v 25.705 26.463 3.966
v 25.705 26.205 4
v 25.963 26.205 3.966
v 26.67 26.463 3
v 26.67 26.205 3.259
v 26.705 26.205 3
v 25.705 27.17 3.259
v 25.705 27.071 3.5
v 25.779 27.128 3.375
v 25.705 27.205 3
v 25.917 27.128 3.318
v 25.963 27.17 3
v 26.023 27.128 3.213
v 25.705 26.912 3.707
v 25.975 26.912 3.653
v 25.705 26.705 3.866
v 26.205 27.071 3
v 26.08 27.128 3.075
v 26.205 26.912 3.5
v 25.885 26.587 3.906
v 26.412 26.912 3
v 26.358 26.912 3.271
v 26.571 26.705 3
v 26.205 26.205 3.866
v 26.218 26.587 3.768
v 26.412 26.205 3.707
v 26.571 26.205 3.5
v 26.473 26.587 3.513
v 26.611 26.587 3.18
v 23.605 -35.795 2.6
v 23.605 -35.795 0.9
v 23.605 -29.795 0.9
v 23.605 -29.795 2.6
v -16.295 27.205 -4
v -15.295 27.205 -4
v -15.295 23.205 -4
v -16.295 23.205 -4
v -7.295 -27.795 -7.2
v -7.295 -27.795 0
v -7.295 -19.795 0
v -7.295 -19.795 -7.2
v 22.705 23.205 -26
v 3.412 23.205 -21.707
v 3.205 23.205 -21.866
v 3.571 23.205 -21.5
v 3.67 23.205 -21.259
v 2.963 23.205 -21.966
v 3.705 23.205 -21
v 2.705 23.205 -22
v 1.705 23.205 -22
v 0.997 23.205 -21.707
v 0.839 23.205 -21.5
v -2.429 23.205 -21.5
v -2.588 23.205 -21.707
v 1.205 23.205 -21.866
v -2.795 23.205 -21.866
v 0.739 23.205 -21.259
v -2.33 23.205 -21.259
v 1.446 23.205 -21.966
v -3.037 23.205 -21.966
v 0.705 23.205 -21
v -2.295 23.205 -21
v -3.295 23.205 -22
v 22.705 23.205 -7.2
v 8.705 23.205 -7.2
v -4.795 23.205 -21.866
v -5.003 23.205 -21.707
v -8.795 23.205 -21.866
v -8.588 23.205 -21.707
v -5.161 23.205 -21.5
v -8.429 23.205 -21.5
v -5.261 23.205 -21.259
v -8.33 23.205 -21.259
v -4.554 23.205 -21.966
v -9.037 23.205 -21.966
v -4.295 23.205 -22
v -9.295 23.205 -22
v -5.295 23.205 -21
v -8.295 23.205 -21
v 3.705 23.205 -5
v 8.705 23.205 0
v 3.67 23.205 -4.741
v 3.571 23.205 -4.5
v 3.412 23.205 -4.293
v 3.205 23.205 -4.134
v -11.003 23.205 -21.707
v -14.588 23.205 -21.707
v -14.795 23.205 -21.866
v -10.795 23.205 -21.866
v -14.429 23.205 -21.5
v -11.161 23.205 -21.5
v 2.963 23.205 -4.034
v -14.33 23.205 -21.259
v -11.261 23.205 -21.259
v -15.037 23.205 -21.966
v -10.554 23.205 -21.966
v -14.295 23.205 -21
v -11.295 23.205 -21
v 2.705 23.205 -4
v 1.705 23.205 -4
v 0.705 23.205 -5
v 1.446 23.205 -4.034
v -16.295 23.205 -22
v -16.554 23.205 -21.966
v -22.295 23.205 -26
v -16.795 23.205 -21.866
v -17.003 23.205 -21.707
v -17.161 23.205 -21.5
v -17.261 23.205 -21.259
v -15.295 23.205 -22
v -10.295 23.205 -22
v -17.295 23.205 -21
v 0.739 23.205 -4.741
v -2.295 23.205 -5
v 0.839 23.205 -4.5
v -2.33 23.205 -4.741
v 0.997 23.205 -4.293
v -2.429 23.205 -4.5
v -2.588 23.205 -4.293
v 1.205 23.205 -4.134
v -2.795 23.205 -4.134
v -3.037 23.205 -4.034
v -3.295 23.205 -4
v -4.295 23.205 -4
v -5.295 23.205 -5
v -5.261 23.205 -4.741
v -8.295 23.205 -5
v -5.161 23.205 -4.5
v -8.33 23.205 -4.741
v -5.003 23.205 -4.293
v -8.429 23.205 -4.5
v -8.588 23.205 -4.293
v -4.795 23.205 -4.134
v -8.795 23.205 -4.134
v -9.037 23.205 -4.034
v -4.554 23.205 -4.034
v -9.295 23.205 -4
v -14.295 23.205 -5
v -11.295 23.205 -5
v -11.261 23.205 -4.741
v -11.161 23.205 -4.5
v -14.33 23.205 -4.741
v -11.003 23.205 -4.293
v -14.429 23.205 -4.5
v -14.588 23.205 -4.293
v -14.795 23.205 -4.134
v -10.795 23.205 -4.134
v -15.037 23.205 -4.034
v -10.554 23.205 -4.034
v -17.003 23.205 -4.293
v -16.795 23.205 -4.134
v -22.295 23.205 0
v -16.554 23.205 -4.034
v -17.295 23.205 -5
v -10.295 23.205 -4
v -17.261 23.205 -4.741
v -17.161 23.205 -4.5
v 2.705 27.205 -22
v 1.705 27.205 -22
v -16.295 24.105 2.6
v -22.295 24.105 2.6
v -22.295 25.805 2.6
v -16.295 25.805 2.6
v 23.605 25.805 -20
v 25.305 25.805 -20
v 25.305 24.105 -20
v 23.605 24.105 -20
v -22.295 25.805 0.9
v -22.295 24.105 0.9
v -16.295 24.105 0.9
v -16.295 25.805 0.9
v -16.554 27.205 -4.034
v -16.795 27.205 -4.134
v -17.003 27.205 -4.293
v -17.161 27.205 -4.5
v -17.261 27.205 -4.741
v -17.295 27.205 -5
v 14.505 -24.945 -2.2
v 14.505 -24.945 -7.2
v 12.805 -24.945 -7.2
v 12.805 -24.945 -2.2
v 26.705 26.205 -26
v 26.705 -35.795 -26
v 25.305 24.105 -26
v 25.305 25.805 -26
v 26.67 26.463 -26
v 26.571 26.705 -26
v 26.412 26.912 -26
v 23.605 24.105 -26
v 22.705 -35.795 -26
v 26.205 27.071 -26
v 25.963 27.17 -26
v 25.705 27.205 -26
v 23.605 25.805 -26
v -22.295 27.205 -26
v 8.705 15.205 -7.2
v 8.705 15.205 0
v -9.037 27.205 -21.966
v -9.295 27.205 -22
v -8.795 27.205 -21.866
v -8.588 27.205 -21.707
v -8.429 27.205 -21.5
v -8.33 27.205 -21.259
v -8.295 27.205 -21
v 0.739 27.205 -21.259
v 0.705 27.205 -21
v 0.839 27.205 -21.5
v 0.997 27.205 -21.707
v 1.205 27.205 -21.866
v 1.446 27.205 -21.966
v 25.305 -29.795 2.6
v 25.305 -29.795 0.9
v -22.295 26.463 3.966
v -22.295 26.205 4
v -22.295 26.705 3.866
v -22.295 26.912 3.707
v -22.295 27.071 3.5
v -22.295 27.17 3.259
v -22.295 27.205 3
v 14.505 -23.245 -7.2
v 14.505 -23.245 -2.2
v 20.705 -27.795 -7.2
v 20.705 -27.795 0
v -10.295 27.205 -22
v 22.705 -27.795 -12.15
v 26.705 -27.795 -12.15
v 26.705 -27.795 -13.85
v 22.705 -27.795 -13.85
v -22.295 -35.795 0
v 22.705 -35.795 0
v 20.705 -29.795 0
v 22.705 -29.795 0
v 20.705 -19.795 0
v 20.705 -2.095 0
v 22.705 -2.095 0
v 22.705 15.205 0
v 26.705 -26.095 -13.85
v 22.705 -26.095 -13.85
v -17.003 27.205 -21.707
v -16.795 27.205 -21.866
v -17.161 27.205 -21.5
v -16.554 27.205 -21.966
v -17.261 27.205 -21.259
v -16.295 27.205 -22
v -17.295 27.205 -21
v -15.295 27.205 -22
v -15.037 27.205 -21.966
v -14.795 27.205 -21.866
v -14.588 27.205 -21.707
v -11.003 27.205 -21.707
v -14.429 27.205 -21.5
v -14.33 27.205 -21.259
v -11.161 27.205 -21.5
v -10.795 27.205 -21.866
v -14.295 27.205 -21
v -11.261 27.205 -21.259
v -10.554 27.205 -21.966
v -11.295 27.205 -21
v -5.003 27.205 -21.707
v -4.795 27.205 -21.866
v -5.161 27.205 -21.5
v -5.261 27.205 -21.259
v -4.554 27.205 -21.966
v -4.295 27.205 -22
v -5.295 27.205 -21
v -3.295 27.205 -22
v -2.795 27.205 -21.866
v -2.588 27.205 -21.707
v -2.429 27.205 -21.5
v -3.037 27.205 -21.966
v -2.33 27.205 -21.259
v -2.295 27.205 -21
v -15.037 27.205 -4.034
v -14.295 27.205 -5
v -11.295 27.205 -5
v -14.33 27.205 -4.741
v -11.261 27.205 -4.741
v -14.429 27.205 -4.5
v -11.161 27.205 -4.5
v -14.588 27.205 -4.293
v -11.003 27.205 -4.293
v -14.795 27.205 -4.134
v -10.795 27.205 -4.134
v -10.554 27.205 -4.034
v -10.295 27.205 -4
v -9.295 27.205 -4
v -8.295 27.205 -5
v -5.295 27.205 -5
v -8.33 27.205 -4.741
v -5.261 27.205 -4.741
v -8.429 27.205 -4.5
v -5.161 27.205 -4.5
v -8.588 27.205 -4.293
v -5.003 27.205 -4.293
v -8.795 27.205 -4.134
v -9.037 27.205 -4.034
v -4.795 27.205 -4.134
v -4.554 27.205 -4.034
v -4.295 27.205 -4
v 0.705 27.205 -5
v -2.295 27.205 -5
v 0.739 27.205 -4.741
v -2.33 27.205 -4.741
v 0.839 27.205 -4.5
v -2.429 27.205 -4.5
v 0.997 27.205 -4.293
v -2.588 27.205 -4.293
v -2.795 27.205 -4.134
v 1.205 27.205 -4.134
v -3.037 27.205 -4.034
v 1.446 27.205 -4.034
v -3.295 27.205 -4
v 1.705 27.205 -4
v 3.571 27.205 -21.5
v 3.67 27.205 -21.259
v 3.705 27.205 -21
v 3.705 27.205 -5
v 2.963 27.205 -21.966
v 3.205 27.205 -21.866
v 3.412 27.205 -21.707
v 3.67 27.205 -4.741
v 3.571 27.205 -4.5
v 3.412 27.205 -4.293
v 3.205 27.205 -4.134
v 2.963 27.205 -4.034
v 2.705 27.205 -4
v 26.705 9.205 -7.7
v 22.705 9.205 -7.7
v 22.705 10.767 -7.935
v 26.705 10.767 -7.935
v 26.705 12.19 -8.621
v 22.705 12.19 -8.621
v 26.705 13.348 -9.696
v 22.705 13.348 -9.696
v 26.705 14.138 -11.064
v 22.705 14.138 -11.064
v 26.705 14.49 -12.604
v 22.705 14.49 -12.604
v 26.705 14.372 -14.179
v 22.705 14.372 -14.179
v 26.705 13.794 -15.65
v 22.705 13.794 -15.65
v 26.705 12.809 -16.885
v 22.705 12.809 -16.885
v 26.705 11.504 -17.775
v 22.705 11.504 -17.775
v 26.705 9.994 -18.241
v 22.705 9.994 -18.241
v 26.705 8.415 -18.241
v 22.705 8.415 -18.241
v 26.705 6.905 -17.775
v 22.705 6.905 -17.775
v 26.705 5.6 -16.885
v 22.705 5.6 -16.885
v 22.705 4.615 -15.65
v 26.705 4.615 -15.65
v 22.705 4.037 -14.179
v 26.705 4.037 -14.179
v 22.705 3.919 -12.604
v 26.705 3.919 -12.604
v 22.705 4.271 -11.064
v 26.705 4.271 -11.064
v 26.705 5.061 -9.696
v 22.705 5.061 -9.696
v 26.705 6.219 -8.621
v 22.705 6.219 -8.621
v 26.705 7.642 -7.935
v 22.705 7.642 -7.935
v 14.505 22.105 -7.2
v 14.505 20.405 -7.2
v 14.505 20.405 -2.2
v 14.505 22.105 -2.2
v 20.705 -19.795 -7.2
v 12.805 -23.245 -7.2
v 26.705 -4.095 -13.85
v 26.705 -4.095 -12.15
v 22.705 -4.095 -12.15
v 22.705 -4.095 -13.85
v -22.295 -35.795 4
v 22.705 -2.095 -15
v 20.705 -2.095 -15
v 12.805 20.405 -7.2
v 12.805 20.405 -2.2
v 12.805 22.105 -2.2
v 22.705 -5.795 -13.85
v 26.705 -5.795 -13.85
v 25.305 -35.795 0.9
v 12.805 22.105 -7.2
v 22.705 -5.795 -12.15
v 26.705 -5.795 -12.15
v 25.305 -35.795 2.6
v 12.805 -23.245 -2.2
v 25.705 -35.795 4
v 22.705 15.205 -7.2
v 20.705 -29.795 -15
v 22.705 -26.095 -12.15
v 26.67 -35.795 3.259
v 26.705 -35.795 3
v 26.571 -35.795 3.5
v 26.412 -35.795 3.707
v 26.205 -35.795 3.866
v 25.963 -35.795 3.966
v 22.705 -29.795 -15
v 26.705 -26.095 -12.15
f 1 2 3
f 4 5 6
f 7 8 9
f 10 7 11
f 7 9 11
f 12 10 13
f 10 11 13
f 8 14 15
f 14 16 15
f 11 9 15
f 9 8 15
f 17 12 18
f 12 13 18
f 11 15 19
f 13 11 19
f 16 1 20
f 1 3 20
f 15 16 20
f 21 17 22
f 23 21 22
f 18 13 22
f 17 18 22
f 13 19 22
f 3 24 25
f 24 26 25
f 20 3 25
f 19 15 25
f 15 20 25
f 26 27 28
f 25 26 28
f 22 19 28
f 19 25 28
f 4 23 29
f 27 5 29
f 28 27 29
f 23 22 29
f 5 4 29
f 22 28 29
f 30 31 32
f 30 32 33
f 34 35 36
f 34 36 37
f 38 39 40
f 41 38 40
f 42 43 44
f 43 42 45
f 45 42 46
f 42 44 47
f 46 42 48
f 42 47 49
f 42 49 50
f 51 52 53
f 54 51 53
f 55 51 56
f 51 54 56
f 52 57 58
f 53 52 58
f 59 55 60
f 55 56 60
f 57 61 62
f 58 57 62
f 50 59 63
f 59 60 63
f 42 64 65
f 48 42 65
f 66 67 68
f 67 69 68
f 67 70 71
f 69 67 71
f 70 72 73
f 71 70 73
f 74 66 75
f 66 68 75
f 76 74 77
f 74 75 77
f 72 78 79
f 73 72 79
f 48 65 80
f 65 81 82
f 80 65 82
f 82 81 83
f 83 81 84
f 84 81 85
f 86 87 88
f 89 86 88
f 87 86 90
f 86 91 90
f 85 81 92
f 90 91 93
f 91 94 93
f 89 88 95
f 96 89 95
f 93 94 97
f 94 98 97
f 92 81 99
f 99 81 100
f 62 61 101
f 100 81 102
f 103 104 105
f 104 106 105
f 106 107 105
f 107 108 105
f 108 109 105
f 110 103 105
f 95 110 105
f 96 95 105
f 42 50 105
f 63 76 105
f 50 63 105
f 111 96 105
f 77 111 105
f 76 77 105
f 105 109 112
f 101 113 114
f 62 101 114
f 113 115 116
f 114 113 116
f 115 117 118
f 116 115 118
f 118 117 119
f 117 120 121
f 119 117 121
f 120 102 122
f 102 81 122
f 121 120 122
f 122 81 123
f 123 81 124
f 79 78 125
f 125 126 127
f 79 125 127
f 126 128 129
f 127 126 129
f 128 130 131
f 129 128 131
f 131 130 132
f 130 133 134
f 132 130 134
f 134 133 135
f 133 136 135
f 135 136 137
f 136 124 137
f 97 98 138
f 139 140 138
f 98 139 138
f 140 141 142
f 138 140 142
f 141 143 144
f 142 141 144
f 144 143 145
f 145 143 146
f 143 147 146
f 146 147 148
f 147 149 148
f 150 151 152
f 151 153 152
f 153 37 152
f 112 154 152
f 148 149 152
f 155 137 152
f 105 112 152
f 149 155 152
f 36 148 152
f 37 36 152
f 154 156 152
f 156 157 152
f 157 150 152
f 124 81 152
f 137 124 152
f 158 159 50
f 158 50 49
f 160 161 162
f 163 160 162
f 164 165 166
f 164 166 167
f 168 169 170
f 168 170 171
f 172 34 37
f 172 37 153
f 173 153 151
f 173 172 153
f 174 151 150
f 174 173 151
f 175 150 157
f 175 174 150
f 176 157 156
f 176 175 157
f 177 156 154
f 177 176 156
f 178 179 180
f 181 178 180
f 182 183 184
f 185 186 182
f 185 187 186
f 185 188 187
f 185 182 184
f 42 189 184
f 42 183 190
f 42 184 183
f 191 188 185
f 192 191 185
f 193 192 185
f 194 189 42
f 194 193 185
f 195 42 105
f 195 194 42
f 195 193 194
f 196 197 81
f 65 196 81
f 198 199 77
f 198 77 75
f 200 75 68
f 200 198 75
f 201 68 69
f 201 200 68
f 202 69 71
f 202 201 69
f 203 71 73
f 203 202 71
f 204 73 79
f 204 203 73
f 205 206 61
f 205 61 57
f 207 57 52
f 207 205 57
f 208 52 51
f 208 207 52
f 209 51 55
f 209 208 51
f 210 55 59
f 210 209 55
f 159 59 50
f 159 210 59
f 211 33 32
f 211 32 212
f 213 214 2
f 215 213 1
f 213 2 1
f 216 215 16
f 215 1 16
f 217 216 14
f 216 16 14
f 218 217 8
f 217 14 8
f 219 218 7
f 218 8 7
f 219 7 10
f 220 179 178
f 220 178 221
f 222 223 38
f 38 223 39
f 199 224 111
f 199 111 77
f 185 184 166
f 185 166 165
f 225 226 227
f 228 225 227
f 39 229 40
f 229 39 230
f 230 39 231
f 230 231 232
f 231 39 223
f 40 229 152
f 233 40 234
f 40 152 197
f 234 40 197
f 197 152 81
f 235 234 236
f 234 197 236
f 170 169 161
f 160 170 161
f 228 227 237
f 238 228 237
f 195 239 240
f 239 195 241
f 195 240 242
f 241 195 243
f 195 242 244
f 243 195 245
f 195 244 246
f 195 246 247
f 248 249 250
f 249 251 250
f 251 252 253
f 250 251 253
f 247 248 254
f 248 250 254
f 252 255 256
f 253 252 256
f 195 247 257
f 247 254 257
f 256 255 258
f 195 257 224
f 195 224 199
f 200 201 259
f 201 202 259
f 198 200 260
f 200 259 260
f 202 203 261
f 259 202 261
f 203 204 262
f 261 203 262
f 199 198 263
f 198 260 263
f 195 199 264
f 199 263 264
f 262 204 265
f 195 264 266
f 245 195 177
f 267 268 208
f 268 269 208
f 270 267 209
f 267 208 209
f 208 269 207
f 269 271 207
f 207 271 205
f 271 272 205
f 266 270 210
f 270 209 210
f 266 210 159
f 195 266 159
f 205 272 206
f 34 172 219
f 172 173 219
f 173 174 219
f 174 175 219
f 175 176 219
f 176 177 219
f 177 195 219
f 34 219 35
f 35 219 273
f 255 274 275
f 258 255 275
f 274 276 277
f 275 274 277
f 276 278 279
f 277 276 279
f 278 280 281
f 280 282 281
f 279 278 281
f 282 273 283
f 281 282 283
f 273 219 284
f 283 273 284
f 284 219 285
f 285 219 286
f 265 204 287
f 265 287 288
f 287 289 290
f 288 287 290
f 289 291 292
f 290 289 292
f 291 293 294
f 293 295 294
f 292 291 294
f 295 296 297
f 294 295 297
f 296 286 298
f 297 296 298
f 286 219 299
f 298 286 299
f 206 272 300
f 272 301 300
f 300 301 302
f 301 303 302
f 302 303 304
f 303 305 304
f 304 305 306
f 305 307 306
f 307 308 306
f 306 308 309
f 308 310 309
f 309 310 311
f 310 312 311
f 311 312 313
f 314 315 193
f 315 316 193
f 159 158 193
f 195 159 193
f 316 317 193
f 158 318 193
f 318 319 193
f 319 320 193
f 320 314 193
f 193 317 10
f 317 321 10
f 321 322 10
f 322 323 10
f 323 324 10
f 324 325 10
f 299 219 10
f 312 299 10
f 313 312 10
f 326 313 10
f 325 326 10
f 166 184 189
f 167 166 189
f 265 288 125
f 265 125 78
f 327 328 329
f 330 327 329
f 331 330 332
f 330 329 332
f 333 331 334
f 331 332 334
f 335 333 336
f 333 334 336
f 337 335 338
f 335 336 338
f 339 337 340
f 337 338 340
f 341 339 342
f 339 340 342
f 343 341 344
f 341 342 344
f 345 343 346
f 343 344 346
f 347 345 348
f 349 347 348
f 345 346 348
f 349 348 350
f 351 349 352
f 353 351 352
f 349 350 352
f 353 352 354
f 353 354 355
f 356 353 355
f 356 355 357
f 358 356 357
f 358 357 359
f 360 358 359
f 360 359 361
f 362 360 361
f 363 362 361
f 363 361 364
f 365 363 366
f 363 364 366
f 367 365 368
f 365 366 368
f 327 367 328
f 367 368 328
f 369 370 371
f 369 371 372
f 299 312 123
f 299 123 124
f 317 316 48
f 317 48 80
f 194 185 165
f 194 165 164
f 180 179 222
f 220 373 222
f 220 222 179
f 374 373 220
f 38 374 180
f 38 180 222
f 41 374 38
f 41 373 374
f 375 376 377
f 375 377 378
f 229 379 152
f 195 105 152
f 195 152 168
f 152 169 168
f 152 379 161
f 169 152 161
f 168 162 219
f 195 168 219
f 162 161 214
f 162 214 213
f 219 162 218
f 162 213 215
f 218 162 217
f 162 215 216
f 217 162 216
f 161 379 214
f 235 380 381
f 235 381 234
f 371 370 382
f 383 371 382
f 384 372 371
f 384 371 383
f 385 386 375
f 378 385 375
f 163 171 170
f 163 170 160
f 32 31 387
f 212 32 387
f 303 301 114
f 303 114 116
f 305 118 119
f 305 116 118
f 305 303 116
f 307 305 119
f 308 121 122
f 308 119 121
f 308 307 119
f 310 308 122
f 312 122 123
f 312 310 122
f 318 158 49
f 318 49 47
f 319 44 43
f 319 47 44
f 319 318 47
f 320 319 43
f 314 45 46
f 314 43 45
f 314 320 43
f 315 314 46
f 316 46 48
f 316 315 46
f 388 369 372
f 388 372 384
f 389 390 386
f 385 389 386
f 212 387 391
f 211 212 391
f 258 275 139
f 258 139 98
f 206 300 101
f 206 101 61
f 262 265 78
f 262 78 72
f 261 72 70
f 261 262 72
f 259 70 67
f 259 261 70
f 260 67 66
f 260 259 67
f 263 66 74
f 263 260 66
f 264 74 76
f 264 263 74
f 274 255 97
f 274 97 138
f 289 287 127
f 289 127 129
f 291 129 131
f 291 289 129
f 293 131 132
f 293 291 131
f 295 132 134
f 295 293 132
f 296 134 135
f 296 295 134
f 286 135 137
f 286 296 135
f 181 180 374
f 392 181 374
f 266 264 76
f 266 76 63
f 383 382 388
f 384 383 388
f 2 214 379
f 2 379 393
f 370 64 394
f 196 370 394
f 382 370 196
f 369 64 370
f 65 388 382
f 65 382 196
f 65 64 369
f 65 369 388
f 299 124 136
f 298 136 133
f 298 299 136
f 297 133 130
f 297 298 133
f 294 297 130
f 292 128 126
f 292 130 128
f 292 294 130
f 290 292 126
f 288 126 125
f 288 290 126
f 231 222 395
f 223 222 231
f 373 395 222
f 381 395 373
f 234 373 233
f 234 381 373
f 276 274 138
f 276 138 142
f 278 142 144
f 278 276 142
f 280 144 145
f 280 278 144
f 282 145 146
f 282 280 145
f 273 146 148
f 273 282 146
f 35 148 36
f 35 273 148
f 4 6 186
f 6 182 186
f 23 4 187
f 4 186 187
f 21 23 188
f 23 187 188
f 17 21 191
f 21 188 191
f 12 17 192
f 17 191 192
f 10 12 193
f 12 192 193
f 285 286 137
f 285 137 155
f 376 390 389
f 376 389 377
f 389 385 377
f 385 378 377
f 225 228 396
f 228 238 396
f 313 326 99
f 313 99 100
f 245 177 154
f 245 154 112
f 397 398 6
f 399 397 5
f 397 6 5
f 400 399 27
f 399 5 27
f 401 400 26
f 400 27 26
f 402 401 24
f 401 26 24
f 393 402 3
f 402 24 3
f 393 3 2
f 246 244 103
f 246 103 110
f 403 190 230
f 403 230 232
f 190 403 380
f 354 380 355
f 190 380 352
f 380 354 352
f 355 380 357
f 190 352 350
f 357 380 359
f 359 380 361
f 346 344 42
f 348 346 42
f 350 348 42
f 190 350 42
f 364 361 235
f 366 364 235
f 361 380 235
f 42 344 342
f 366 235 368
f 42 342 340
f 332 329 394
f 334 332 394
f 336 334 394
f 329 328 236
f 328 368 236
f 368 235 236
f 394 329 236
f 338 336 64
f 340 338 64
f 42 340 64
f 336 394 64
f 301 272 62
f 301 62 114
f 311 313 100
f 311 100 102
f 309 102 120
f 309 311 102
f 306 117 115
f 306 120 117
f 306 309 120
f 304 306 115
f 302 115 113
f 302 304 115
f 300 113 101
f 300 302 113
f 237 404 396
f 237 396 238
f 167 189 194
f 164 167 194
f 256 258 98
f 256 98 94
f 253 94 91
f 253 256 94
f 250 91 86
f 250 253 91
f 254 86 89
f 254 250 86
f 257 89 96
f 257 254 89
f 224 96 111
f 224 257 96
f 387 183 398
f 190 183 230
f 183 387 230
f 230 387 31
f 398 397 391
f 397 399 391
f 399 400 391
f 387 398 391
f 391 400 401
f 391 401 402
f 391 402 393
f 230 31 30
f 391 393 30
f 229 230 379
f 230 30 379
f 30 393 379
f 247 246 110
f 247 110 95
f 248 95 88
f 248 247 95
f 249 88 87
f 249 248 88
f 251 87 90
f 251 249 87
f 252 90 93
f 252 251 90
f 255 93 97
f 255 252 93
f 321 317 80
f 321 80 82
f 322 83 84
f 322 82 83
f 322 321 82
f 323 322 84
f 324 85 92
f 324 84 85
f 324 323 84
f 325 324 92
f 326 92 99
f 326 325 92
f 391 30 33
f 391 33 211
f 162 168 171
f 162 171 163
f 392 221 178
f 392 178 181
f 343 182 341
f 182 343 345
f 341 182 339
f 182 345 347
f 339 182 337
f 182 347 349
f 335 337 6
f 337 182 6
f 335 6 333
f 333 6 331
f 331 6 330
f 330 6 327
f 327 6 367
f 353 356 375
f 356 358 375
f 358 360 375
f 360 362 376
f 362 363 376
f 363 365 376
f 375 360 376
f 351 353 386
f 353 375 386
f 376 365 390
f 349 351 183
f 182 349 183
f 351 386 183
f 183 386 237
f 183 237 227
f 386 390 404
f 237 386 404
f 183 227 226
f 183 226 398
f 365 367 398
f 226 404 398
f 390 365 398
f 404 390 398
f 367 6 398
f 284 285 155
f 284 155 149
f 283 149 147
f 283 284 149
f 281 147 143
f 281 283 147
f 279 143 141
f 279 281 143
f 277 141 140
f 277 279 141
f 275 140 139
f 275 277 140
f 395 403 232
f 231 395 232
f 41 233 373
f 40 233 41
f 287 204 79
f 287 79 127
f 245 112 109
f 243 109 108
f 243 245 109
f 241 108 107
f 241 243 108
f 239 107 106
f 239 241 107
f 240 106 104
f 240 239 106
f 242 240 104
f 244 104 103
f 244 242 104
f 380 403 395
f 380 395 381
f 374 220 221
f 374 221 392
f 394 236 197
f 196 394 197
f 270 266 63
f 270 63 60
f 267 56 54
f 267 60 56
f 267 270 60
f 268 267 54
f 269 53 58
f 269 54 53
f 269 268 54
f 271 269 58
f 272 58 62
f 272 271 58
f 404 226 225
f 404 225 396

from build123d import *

# Parameters (mm, degrees)
SKETCH_1_W          = 49
SKETCH_1_H          = 63
EXTRUDE_1_DEPTH     = 4
SKETCH_2_W          = 45
SKETCH_2_H          = 4
SKETCH_2_W_2        = 4
SKETCH_2_H_2        = 59
EXTRUDE_2_DEPTH     = 26
SKETCH_3_W          = 14
SKETCH_3_H          = 8
SKETCH_3_W_2        = 30
EXTRUDE_3_DEPTH     = 7.2
SKETCH_5_R          = 5.3
CUT_EXTRUDE_1_DEPTH = 4
SKETCH_7_W          = 1.7
SKETCH_7_H          = 1.7
CUT_EXTRUDE_3_DEPTH = 6
SKETCH_8_W          = 1.7
SKETCH_8_H          = 1.7
CUT_EXTRUDE_4_DEPTH = 6
SKETCH_9_W          = 1.7
SKETCH_9_H          = 1.7
CUT_EXTRUDE_5_DEPTH = 6
FILLET_1_R          = 1
SKETCH_6_W          = 1.7
SKETCH_6_H          = 1.7
CUT_EXTRUDE_7_DEPTH = 5
SKETCH_10_W         = 15
SKETCH_10_H         = 27.7
EXTRUDE_4_DEPTH     = 2
CUT_EXTRUDE_8_DEPTH = 13
SKETCH_12_W         = 1.7
SKETCH_12_H         = 1.7
CUT_EXTRUDE_9_DEPTH = 5


with BuildPart() as part:
    # Эскиз1 → Бобышка-Вытянуть1 (new body)
    with BuildSketch(Plane.XY):
        with Locations((2.204545455, -4.295454545)):
            Rectangle(SKETCH_1_W, SKETCH_1_H)
    extrude(amount=EXTRUDE_1_DEPTH)

    # Эскиз2 → Бобышка-Вытянуть2 (add)
    with BuildSketch(Plane(origin=(0, 0, 0), x_dir=(-1, 0, 0), z_dir=(0, 0, -1))):
        with Locations((-0.204545455, 25.204545455)):
            Rectangle(SKETCH_2_W, SKETCH_2_H)
        with Locations((-24.704545455, -6.295454545)):
            Rectangle(SKETCH_2_W_2, SKETCH_2_H_2)
        with Locations((-24.704545455, 25.204545455)):
            Rectangle(SKETCH_2_W_2, SKETCH_2_H)
    extrude(amount=EXTRUDE_2_DEPTH)

    # Эскиз3 → Бобышка-Вытянуть3 (add)
    with BuildSketch(Plane(origin=(0, 0, 0), x_dir=(-1, 0, 0), z_dir=(0, 0, -1))):
        with Locations((-15.704545455, 19.204545455)):
            Rectangle(SKETCH_3_W, SKETCH_3_H)
        with Locations((-7.704545455, -23.795454545)):
            Rectangle(SKETCH_3_W_2, SKETCH_3_H)
    extrude(amount=EXTRUDE_3_DEPTH)

    # Эскиз5 → Вырез-Вытянуть1 (cut)
    with BuildSketch(Plane.ZY.offset(-22.704545455)):
        with Locations((-13, 9.204545455)):
            Circle(SKETCH_5_R)
    extrude(amount=-CUT_EXTRUDE_1_DEPTH, mode=Mode.SUBTRACT)

    # Эскиз7 → Вырез-Вытянуть3 (cut)
    with BuildSketch(Plane.ZY.offset(22.295454545)):
        with Locations((1.75, 24.954545455)):
            Rectangle(SKETCH_7_W, SKETCH_7_H)
    extrude(amount=-CUT_EXTRUDE_3_DEPTH, mode=Mode.SUBTRACT)

    # Эскиз8 → Вырез-Вытянуть4 (cut)
    with BuildSketch(Plane.XZ.offset(35.795454545)):
        with Locations((24.454545455, 1.75)):
            Rectangle(SKETCH_8_W, SKETCH_8_H)
    extrude(amount=-CUT_EXTRUDE_4_DEPTH, mode=Mode.SUBTRACT)

    # Эскиз9 → Вырез-Вытянуть5 (cut)
    with BuildSketch(Plane(origin=(0, 0, -26), x_dir=(-1, 0, 0), z_dir=(0, 0, -1))):
        with Locations((-24.454545455, 24.954545455)):
            Rectangle(SKETCH_9_W, SKETCH_9_H)
    extrude(amount=-CUT_EXTRUDE_5_DEPTH, mode=Mode.SUBTRACT)

    # Скругление1
    fillet_1_edges = [part.edges().sort_by_distance(p)[0] for p in [
        (26.704545455, -4.295454545, 4),
        (2.204545455, 27.204545455, 4),
        (26.704545455, 27.204545455, -11),
    ]]
    fillet(fillet_1_edges, radius=FILLET_1_R)

    # Эскиз6 → Вырез-Вытянуть7 (cut)
    with BuildSketch(Plane(origin=(26.704545455, 0, 0), x_dir=(0, 0, -1), z_dir=(1, 0, 0))):
        with Locations((13, -4.945454545)):
            Rectangle(SKETCH_6_W, SKETCH_6_H)
        with Locations((13, -26.945454545)):
            Rectangle(SKETCH_6_W, SKETCH_6_H)
    extrude(amount=-CUT_EXTRUDE_7_DEPTH, mode=Mode.SUBTRACT)

    # Эскиз10 → Бобышка-Вытянуть4 (add)
    with BuildSketch(Plane.ZY.offset(-22.704545455)):
        with Locations((-7.5, -15.945454545)):
            Rectangle(SKETCH_10_W, SKETCH_10_H)
    extrude(amount=EXTRUDE_4_DEPTH)

    # Эскиз11 → Вырез-Вытянуть8 (cut)
    with BuildSketch(Plane(origin=(0, 27.204545455, 0), x_dir=(1, 0, 0), z_dir=(0, 1, 0))):
        with BuildLine():
            Line((2.704545455, 4), (1.704545455, 4))
            ThreePointArc((1.704545455, 4), (0.997438673, 4.292893219), (0.704545455, 5))
            Line((0.704545455, 5), (0.704545455, 21))
            ThreePointArc((0.704545455, 21), (0.997438673, 21.707106781), (1.704545455, 22))
            Line((1.704545455, 22), (2.704545455, 22))
            ThreePointArc((2.704545455, 22), (3.411652236, 21.707106781), (3.704545455, 21))
            Line((3.704545455, 21), (3.704545455, 5))
            ThreePointArc((3.704545455, 5), (3.411652236, 4.292893219), (2.704545455, 4))
        make_face()
        with BuildLine():
            Line((-3.295454545, 4), (-4.295454545, 4))
            ThreePointArc((-4.295454545, 4), (-5.002561327, 4.292893219), (-5.295454545, 5))
            Line((-5.295454545, 5), (-5.295454545, 21))
            ThreePointArc((-5.295454545, 21), (-5.002561327, 21.707106781), (-4.295454545, 22))
            Line((-4.295454545, 22), (-3.295454545, 22))
            ThreePointArc((-3.295454545, 22), (-2.588347764, 21.707106781), (-2.295454545, 21))
            Line((-2.295454545, 21), (-2.295454545, 5))
            ThreePointArc((-2.295454545, 5), (-2.588347764, 4.292893219), (-3.295454545, 4))
        make_face()
        with BuildLine():
            Line((-9.295454545, 4), (-10.295454545, 4))
            ThreePointArc((-10.295454545, 4), (-11.002561327, 4.292893219), (-11.295454545, 5))
            Line((-11.295454545, 5), (-11.295454545, 21))
            ThreePointArc((-11.295454545, 21), (-11.002561327, 21.707106781), (-10.295454545, 22))
            Line((-10.295454545, 22), (-9.295454545, 22))
            ThreePointArc((-9.295454545, 22), (-8.588347764, 21.707106781), (-8.295454545, 21))
            Line((-8.295454545, 21), (-8.295454545, 5))
            ThreePointArc((-8.295454545, 5), (-8.588347764, 4.292893219), (-9.295454545, 4))
        make_face()
        with BuildLine():
            Line((-15.295454545, 4), (-16.295454545, 4))
            ThreePointArc((-16.295454545, 4), (-17.002561327, 4.292893219), (-17.295454545, 5))
            Line((-17.295454545, 5), (-17.295454545, 21))
            ThreePointArc((-17.295454545, 21), (-17.002561327, 21.707106781), (-16.295454545, 22))
            Line((-16.295454545, 22), (-15.295454545, 22))
            ThreePointArc((-15.295454545, 22), (-14.588347764, 21.707106781), (-14.295454545, 21))
            Line((-14.295454545, 21), (-14.295454545, 5))
            ThreePointArc((-14.295454545, 5), (-14.588347764, 4.292893219), (-15.295454545, 4))
        make_face()
    extrude(amount=-CUT_EXTRUDE_8_DEPTH, mode=Mode.SUBTRACT)

    # Эскиз12 → Вырез-Вытянуть9 (cut)
    with BuildSketch(Plane(origin=(0, 0, -7.2), x_dir=(-1, 0, 0), z_dir=(0, 0, -1))):
        with Locations((-13.654545455, 21.254545455)):
            Rectangle(SKETCH_12_W, SKETCH_12_H)
        with Locations((-13.654545455, -24.095454545)):
            Rectangle(SKETCH_12_W, SKETCH_12_H)
    extrude(amount=-CUT_EXTRUDE_9_DEPTH, mode=Mode.SUBTRACT)


solid = part.part
